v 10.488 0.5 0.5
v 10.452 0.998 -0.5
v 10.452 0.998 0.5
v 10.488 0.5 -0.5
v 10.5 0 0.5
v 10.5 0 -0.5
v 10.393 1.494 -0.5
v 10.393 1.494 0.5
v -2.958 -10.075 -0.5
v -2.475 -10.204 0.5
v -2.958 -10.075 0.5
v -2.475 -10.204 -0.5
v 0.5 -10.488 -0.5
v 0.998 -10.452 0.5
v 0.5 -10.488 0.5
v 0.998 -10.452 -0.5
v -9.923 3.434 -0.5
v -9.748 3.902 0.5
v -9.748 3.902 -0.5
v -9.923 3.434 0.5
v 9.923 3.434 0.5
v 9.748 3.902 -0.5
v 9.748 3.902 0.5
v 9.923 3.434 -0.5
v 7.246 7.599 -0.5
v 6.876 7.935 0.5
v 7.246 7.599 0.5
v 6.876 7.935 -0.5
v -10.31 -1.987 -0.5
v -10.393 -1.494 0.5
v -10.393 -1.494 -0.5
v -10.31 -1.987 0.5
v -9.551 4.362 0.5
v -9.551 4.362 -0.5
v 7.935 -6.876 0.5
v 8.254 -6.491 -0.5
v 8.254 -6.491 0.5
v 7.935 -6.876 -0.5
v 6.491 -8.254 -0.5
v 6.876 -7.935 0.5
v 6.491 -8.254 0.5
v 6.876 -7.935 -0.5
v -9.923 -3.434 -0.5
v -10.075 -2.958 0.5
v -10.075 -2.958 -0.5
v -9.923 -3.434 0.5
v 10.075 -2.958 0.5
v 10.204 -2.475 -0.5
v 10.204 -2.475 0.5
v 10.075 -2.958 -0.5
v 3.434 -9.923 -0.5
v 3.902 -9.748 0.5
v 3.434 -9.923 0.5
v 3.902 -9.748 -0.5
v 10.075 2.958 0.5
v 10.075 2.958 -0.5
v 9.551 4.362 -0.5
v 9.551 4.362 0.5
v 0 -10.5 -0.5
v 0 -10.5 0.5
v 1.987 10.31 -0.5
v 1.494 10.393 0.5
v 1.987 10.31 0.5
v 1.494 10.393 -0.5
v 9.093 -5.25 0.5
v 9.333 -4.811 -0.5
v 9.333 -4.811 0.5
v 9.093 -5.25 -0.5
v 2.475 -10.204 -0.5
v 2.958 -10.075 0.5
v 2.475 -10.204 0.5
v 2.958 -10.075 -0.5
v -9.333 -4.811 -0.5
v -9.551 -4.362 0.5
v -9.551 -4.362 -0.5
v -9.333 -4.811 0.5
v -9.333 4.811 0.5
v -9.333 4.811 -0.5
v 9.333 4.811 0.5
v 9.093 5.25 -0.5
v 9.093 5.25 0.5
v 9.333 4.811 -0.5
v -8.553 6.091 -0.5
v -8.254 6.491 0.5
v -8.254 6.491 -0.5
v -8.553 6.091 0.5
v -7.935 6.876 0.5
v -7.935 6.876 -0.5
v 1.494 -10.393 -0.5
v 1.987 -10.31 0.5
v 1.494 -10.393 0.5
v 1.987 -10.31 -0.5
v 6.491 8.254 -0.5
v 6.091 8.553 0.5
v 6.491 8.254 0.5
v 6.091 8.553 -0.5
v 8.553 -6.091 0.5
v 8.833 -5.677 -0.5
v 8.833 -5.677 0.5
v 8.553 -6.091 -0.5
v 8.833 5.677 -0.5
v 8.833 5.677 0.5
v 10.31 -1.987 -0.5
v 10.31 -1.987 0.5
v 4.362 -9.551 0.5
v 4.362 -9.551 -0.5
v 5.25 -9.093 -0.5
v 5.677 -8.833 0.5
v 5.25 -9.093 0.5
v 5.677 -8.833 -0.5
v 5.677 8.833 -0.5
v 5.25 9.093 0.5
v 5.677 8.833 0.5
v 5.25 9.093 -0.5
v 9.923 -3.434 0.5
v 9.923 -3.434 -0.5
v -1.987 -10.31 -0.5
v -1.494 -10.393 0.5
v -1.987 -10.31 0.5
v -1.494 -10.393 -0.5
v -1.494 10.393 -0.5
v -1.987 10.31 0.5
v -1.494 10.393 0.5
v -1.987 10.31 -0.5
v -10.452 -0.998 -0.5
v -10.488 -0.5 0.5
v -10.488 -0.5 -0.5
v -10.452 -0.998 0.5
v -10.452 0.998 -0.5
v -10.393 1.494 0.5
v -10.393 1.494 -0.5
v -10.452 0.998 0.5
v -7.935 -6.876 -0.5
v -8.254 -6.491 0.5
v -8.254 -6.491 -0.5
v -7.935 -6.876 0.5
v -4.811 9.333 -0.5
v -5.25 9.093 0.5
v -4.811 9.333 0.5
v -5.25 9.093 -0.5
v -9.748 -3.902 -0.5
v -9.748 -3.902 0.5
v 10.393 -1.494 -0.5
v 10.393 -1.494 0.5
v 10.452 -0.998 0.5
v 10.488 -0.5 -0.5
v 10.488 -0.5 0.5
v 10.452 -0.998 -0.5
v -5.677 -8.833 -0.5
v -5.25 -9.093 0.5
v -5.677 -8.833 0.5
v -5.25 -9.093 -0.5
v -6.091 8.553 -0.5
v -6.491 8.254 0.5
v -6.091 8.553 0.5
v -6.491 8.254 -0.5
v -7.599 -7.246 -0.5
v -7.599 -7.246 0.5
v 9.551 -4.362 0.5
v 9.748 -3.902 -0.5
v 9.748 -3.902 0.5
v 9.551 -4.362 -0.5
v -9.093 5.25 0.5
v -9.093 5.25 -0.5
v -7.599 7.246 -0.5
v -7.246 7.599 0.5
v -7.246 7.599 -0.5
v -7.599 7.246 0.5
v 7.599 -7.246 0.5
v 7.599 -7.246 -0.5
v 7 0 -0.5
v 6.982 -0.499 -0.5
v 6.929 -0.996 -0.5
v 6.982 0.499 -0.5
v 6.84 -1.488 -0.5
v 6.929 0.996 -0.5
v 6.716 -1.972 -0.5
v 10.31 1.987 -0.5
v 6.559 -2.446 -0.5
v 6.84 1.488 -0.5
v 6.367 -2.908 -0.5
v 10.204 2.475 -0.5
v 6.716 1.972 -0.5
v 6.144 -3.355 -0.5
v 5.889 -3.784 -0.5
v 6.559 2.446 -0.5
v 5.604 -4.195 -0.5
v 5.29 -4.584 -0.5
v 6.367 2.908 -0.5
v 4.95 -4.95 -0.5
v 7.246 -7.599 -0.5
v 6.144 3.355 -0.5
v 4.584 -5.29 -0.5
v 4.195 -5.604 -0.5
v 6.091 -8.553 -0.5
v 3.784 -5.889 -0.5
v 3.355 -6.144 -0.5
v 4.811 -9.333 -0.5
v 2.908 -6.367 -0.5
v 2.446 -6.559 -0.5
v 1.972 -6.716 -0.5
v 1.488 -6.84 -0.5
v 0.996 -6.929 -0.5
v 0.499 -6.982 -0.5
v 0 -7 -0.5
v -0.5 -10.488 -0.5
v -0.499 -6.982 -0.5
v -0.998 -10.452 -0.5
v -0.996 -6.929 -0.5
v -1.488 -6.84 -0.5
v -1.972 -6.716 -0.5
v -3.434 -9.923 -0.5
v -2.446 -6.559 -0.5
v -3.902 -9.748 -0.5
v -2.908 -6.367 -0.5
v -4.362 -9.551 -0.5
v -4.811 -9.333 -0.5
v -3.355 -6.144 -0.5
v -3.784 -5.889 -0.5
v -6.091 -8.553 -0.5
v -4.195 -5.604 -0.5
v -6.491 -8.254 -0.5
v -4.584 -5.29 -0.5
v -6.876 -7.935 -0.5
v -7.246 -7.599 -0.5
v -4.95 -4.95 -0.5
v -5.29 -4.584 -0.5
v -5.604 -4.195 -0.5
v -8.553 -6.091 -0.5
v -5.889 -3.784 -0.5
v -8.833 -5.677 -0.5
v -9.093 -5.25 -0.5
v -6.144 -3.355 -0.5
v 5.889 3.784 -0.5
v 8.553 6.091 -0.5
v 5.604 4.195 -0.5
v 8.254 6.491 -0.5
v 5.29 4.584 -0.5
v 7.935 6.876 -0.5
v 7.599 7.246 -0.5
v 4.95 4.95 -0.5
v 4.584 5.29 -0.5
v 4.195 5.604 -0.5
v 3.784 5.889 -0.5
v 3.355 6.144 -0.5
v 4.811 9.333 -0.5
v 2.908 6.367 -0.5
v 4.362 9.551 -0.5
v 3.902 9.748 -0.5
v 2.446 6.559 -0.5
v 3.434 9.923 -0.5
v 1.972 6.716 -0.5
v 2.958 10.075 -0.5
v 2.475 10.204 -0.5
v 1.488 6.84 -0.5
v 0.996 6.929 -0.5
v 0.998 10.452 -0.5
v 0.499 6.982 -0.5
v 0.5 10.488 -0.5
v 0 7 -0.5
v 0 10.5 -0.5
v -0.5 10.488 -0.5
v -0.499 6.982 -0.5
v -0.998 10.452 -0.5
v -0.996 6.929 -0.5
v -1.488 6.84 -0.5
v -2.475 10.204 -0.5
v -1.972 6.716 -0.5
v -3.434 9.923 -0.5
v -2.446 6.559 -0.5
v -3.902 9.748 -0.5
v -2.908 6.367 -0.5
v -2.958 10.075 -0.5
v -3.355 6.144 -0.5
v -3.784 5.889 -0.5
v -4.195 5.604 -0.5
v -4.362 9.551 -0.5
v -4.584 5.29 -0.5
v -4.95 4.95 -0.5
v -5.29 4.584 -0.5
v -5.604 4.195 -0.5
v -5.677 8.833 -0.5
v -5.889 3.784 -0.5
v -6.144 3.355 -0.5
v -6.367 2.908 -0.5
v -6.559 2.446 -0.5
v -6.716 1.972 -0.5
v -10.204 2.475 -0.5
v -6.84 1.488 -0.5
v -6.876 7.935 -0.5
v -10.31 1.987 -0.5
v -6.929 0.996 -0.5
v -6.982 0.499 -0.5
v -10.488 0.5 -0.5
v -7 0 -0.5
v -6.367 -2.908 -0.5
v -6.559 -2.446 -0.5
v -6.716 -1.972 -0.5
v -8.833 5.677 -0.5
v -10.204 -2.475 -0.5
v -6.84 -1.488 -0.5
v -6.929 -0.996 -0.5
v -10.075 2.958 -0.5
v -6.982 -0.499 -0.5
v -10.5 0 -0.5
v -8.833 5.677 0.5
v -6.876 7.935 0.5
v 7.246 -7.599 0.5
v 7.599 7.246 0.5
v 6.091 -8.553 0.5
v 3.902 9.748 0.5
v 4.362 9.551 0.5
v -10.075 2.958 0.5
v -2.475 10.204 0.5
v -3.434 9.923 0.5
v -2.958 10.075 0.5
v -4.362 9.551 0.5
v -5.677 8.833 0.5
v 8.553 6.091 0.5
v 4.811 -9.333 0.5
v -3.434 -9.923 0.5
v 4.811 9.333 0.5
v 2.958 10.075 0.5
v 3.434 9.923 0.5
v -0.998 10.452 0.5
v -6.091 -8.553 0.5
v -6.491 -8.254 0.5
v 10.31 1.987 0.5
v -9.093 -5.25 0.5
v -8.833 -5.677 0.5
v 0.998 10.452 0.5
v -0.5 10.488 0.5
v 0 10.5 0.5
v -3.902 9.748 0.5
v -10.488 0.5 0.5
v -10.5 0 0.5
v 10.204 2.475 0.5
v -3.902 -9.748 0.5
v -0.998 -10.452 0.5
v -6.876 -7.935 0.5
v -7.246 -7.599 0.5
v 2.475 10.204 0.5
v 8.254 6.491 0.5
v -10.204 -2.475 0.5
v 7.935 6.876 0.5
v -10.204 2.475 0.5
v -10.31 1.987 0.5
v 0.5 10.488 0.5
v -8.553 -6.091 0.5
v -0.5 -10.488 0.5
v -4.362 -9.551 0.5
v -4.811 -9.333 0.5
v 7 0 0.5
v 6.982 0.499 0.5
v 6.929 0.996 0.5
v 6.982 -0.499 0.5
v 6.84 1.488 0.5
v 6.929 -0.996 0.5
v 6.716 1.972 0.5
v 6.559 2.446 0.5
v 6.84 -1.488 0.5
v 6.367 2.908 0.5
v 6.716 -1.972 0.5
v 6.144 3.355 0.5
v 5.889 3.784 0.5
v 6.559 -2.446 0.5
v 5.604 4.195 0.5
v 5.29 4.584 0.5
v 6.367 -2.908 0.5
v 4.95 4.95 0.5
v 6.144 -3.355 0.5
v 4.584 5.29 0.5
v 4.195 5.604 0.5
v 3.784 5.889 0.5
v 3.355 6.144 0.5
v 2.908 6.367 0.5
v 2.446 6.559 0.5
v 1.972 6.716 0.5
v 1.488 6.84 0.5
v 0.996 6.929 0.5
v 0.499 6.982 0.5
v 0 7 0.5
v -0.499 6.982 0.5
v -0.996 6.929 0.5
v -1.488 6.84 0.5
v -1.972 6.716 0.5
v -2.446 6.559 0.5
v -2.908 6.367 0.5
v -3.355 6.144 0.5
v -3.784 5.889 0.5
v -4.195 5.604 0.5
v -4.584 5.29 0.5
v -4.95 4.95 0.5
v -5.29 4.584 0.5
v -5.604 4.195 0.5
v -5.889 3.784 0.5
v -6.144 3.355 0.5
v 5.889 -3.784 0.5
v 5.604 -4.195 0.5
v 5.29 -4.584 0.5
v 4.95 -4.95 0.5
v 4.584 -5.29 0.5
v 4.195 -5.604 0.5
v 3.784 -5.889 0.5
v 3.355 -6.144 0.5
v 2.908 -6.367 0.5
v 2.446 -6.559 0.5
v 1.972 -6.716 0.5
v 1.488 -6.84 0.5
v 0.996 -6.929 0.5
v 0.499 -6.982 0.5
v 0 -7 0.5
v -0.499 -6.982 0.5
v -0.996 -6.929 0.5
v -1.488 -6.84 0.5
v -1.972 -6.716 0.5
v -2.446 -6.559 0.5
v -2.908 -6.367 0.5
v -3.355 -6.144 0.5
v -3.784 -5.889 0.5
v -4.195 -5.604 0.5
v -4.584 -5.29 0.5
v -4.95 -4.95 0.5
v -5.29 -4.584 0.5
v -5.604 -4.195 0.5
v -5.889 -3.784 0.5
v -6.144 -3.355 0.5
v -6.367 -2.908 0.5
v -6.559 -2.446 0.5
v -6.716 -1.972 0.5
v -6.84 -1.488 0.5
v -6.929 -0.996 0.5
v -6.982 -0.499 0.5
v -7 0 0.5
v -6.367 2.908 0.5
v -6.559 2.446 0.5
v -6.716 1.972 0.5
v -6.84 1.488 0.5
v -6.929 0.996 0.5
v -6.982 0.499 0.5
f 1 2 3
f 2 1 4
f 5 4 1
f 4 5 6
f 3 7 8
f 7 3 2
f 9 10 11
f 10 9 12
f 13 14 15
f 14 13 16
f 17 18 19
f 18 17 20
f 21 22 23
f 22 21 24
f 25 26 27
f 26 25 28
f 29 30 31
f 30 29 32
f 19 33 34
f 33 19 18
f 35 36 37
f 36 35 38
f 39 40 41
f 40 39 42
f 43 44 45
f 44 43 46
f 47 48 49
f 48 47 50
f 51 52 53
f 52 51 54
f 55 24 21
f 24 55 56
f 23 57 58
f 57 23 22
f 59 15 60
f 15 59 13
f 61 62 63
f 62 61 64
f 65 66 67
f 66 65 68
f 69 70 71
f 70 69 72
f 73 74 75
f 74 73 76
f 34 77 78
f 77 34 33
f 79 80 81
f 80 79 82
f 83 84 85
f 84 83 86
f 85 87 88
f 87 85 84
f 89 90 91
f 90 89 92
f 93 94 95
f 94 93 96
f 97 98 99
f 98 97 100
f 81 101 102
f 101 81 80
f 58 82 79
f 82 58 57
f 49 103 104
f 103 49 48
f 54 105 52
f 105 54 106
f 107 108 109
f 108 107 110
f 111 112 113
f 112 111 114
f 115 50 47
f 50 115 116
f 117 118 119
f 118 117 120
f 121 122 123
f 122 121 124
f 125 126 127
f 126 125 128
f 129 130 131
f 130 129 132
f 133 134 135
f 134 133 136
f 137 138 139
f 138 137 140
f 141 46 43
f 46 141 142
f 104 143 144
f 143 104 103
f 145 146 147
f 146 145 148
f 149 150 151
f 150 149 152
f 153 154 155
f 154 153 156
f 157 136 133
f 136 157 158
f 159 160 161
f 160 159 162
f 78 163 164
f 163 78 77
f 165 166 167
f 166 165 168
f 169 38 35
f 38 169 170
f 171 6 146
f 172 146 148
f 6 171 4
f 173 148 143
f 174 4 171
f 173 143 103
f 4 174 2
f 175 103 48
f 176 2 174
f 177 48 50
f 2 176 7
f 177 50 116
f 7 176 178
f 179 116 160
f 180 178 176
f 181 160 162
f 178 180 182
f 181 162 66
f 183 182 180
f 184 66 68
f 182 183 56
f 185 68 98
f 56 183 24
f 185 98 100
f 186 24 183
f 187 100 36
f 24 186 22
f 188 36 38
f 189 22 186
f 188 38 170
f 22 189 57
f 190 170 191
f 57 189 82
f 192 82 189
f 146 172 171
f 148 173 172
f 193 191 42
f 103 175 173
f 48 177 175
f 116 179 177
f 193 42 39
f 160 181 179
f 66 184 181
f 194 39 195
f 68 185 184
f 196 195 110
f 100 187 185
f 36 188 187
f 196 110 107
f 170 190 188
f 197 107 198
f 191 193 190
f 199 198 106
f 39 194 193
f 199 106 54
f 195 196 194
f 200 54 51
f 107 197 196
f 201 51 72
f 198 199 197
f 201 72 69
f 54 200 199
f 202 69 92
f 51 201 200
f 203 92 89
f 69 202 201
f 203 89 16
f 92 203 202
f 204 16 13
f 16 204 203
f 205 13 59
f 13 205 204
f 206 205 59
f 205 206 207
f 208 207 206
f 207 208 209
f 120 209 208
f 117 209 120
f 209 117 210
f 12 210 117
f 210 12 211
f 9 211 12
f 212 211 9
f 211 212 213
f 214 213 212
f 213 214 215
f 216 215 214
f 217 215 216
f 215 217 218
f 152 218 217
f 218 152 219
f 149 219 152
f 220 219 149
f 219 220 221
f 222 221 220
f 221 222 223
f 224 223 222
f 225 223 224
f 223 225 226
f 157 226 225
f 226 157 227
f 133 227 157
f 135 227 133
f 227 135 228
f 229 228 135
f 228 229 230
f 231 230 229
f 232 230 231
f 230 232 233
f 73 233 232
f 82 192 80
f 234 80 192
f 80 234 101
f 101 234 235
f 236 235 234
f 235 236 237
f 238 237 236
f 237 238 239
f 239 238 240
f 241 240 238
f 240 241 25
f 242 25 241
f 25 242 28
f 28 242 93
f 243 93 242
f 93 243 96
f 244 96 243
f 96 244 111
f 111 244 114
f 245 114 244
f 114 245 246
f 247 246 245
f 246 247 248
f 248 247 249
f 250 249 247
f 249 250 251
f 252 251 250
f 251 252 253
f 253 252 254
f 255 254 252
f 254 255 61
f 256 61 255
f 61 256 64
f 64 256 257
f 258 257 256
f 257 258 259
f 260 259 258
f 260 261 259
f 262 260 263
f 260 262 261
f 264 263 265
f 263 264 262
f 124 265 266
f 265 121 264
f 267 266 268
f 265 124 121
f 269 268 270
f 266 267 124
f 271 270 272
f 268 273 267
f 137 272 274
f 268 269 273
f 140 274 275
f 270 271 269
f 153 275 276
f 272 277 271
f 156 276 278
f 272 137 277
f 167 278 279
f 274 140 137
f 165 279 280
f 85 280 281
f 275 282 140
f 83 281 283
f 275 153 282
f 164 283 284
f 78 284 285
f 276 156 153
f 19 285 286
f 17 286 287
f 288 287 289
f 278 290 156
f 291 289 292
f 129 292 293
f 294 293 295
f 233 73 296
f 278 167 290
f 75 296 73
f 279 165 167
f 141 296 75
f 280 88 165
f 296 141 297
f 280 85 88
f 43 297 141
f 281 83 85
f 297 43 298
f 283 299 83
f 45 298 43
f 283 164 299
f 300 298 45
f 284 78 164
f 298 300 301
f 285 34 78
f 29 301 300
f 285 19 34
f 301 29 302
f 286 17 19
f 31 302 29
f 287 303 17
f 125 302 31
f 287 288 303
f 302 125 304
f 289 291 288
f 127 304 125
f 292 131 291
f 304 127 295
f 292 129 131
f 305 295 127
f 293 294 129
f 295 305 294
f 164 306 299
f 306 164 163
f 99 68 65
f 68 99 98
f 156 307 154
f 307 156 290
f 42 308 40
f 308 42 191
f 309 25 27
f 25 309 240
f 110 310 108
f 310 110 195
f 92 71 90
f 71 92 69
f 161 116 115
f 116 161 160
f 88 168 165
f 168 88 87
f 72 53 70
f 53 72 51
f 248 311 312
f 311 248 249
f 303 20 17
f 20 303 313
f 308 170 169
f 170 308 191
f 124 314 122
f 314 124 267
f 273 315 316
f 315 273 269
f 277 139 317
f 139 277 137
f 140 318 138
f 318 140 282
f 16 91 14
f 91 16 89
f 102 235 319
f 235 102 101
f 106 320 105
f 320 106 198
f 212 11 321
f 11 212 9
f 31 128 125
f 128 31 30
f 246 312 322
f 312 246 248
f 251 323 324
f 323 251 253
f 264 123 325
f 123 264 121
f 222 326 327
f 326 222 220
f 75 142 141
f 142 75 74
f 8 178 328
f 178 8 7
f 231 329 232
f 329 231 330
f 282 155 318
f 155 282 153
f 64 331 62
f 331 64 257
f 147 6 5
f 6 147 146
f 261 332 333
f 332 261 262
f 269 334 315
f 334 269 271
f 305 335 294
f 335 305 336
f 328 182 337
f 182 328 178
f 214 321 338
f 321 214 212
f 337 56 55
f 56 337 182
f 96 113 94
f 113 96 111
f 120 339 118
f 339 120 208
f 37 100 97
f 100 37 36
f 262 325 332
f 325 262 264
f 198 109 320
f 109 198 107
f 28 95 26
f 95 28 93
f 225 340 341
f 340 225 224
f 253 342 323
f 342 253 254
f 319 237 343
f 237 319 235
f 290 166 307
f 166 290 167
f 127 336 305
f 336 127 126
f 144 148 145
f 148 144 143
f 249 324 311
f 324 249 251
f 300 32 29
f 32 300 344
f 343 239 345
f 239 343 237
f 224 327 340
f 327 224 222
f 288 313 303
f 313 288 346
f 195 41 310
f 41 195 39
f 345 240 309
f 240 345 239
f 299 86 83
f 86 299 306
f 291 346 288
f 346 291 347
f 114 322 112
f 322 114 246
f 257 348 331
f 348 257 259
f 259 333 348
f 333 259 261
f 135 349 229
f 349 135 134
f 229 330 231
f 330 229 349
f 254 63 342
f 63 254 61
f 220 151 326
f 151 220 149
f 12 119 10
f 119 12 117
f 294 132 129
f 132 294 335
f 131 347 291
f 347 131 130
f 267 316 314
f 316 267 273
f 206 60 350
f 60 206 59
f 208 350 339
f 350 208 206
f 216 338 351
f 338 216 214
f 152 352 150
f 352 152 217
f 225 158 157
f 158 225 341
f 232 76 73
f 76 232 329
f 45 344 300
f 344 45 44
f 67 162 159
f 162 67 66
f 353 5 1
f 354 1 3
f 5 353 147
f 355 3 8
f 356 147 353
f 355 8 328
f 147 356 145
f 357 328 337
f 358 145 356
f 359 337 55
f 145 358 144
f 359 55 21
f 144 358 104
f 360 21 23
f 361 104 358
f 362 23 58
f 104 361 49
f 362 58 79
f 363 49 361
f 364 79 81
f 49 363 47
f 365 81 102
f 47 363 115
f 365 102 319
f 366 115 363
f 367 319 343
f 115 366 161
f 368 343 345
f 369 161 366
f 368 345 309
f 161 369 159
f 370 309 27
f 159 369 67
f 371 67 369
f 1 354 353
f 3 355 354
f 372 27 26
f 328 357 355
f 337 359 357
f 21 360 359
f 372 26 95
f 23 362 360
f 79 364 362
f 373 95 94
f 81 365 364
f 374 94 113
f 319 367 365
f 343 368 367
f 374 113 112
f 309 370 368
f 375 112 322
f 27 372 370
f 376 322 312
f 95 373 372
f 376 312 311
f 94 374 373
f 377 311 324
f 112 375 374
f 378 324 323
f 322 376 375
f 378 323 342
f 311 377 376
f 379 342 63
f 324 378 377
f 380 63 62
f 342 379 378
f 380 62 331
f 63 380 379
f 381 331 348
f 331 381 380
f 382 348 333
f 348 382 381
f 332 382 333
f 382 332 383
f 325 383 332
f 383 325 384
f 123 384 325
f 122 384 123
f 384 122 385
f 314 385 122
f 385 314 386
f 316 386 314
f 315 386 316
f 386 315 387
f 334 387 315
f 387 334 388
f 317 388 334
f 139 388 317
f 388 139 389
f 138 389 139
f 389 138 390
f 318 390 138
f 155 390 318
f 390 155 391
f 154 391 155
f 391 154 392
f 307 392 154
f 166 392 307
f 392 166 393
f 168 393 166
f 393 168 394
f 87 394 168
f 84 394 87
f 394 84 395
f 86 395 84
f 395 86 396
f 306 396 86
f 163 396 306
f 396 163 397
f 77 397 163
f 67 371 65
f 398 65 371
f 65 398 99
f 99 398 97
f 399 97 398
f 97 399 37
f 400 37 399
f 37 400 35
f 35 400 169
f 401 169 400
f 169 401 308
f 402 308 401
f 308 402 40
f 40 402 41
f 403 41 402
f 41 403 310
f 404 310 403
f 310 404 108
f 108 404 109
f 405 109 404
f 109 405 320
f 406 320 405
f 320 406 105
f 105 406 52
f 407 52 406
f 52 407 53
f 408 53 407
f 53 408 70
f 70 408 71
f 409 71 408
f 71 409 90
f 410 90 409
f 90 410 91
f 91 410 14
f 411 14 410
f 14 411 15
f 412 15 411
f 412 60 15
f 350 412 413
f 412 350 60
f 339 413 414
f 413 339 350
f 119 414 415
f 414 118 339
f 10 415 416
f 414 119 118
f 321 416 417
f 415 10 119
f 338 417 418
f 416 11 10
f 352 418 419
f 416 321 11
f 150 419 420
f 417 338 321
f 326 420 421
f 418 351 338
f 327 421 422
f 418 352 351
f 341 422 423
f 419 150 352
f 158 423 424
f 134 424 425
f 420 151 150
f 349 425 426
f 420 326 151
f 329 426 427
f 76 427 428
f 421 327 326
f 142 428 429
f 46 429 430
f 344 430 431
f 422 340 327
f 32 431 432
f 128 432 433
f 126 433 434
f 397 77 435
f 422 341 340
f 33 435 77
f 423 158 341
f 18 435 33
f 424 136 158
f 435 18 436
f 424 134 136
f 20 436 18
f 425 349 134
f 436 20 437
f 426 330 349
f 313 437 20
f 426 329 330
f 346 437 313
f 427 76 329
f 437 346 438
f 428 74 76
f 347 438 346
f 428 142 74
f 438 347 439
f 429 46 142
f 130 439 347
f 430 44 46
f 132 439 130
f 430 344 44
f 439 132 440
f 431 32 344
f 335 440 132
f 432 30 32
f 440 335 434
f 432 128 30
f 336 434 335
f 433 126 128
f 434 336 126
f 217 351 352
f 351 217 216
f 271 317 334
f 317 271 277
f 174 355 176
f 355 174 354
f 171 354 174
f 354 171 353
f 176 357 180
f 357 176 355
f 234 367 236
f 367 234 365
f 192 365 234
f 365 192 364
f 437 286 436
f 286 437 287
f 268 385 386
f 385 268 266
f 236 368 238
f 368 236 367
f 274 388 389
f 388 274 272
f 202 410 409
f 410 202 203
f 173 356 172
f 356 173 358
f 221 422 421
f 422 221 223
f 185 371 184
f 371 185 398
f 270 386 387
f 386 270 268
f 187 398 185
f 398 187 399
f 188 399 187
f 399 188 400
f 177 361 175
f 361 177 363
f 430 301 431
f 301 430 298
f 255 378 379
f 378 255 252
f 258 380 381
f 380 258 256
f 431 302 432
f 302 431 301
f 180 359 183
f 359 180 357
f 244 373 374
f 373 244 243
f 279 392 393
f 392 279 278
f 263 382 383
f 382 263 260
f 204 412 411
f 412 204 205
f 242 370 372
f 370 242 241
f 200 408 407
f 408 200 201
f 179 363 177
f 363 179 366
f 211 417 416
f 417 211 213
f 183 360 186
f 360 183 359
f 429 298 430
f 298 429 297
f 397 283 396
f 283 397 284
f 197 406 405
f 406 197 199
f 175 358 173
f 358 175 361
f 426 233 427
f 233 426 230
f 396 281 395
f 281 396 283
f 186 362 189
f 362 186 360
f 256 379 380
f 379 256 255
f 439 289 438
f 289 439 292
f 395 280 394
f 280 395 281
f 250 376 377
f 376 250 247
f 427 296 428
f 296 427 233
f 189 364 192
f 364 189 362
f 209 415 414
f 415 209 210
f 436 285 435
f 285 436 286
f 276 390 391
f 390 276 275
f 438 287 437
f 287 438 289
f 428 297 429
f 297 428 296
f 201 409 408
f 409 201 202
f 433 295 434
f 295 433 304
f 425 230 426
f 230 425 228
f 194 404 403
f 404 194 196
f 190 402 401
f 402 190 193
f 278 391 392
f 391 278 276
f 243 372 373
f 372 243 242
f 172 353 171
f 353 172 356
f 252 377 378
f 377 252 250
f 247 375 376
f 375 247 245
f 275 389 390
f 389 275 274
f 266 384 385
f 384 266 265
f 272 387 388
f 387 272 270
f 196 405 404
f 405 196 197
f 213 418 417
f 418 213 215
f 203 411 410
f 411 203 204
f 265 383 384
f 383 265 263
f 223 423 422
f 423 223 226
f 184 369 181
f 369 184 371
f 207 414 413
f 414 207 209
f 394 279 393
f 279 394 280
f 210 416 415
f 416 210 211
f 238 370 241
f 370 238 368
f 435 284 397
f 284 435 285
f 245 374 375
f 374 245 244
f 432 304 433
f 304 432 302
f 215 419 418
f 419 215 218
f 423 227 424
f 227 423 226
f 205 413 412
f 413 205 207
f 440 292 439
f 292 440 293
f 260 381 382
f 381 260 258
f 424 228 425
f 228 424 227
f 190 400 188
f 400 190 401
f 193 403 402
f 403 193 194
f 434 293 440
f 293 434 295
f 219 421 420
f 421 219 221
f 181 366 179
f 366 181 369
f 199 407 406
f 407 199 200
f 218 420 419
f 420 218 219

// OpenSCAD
// washer dimentions
od = 21;
id = 14;
h = 1;

$fa=.5;
$fs = .5;

difference(){
    cylinder(r=od/2,h=h,center=true);
	cylinder(r=id/2,h=h+1,center=true);
}
